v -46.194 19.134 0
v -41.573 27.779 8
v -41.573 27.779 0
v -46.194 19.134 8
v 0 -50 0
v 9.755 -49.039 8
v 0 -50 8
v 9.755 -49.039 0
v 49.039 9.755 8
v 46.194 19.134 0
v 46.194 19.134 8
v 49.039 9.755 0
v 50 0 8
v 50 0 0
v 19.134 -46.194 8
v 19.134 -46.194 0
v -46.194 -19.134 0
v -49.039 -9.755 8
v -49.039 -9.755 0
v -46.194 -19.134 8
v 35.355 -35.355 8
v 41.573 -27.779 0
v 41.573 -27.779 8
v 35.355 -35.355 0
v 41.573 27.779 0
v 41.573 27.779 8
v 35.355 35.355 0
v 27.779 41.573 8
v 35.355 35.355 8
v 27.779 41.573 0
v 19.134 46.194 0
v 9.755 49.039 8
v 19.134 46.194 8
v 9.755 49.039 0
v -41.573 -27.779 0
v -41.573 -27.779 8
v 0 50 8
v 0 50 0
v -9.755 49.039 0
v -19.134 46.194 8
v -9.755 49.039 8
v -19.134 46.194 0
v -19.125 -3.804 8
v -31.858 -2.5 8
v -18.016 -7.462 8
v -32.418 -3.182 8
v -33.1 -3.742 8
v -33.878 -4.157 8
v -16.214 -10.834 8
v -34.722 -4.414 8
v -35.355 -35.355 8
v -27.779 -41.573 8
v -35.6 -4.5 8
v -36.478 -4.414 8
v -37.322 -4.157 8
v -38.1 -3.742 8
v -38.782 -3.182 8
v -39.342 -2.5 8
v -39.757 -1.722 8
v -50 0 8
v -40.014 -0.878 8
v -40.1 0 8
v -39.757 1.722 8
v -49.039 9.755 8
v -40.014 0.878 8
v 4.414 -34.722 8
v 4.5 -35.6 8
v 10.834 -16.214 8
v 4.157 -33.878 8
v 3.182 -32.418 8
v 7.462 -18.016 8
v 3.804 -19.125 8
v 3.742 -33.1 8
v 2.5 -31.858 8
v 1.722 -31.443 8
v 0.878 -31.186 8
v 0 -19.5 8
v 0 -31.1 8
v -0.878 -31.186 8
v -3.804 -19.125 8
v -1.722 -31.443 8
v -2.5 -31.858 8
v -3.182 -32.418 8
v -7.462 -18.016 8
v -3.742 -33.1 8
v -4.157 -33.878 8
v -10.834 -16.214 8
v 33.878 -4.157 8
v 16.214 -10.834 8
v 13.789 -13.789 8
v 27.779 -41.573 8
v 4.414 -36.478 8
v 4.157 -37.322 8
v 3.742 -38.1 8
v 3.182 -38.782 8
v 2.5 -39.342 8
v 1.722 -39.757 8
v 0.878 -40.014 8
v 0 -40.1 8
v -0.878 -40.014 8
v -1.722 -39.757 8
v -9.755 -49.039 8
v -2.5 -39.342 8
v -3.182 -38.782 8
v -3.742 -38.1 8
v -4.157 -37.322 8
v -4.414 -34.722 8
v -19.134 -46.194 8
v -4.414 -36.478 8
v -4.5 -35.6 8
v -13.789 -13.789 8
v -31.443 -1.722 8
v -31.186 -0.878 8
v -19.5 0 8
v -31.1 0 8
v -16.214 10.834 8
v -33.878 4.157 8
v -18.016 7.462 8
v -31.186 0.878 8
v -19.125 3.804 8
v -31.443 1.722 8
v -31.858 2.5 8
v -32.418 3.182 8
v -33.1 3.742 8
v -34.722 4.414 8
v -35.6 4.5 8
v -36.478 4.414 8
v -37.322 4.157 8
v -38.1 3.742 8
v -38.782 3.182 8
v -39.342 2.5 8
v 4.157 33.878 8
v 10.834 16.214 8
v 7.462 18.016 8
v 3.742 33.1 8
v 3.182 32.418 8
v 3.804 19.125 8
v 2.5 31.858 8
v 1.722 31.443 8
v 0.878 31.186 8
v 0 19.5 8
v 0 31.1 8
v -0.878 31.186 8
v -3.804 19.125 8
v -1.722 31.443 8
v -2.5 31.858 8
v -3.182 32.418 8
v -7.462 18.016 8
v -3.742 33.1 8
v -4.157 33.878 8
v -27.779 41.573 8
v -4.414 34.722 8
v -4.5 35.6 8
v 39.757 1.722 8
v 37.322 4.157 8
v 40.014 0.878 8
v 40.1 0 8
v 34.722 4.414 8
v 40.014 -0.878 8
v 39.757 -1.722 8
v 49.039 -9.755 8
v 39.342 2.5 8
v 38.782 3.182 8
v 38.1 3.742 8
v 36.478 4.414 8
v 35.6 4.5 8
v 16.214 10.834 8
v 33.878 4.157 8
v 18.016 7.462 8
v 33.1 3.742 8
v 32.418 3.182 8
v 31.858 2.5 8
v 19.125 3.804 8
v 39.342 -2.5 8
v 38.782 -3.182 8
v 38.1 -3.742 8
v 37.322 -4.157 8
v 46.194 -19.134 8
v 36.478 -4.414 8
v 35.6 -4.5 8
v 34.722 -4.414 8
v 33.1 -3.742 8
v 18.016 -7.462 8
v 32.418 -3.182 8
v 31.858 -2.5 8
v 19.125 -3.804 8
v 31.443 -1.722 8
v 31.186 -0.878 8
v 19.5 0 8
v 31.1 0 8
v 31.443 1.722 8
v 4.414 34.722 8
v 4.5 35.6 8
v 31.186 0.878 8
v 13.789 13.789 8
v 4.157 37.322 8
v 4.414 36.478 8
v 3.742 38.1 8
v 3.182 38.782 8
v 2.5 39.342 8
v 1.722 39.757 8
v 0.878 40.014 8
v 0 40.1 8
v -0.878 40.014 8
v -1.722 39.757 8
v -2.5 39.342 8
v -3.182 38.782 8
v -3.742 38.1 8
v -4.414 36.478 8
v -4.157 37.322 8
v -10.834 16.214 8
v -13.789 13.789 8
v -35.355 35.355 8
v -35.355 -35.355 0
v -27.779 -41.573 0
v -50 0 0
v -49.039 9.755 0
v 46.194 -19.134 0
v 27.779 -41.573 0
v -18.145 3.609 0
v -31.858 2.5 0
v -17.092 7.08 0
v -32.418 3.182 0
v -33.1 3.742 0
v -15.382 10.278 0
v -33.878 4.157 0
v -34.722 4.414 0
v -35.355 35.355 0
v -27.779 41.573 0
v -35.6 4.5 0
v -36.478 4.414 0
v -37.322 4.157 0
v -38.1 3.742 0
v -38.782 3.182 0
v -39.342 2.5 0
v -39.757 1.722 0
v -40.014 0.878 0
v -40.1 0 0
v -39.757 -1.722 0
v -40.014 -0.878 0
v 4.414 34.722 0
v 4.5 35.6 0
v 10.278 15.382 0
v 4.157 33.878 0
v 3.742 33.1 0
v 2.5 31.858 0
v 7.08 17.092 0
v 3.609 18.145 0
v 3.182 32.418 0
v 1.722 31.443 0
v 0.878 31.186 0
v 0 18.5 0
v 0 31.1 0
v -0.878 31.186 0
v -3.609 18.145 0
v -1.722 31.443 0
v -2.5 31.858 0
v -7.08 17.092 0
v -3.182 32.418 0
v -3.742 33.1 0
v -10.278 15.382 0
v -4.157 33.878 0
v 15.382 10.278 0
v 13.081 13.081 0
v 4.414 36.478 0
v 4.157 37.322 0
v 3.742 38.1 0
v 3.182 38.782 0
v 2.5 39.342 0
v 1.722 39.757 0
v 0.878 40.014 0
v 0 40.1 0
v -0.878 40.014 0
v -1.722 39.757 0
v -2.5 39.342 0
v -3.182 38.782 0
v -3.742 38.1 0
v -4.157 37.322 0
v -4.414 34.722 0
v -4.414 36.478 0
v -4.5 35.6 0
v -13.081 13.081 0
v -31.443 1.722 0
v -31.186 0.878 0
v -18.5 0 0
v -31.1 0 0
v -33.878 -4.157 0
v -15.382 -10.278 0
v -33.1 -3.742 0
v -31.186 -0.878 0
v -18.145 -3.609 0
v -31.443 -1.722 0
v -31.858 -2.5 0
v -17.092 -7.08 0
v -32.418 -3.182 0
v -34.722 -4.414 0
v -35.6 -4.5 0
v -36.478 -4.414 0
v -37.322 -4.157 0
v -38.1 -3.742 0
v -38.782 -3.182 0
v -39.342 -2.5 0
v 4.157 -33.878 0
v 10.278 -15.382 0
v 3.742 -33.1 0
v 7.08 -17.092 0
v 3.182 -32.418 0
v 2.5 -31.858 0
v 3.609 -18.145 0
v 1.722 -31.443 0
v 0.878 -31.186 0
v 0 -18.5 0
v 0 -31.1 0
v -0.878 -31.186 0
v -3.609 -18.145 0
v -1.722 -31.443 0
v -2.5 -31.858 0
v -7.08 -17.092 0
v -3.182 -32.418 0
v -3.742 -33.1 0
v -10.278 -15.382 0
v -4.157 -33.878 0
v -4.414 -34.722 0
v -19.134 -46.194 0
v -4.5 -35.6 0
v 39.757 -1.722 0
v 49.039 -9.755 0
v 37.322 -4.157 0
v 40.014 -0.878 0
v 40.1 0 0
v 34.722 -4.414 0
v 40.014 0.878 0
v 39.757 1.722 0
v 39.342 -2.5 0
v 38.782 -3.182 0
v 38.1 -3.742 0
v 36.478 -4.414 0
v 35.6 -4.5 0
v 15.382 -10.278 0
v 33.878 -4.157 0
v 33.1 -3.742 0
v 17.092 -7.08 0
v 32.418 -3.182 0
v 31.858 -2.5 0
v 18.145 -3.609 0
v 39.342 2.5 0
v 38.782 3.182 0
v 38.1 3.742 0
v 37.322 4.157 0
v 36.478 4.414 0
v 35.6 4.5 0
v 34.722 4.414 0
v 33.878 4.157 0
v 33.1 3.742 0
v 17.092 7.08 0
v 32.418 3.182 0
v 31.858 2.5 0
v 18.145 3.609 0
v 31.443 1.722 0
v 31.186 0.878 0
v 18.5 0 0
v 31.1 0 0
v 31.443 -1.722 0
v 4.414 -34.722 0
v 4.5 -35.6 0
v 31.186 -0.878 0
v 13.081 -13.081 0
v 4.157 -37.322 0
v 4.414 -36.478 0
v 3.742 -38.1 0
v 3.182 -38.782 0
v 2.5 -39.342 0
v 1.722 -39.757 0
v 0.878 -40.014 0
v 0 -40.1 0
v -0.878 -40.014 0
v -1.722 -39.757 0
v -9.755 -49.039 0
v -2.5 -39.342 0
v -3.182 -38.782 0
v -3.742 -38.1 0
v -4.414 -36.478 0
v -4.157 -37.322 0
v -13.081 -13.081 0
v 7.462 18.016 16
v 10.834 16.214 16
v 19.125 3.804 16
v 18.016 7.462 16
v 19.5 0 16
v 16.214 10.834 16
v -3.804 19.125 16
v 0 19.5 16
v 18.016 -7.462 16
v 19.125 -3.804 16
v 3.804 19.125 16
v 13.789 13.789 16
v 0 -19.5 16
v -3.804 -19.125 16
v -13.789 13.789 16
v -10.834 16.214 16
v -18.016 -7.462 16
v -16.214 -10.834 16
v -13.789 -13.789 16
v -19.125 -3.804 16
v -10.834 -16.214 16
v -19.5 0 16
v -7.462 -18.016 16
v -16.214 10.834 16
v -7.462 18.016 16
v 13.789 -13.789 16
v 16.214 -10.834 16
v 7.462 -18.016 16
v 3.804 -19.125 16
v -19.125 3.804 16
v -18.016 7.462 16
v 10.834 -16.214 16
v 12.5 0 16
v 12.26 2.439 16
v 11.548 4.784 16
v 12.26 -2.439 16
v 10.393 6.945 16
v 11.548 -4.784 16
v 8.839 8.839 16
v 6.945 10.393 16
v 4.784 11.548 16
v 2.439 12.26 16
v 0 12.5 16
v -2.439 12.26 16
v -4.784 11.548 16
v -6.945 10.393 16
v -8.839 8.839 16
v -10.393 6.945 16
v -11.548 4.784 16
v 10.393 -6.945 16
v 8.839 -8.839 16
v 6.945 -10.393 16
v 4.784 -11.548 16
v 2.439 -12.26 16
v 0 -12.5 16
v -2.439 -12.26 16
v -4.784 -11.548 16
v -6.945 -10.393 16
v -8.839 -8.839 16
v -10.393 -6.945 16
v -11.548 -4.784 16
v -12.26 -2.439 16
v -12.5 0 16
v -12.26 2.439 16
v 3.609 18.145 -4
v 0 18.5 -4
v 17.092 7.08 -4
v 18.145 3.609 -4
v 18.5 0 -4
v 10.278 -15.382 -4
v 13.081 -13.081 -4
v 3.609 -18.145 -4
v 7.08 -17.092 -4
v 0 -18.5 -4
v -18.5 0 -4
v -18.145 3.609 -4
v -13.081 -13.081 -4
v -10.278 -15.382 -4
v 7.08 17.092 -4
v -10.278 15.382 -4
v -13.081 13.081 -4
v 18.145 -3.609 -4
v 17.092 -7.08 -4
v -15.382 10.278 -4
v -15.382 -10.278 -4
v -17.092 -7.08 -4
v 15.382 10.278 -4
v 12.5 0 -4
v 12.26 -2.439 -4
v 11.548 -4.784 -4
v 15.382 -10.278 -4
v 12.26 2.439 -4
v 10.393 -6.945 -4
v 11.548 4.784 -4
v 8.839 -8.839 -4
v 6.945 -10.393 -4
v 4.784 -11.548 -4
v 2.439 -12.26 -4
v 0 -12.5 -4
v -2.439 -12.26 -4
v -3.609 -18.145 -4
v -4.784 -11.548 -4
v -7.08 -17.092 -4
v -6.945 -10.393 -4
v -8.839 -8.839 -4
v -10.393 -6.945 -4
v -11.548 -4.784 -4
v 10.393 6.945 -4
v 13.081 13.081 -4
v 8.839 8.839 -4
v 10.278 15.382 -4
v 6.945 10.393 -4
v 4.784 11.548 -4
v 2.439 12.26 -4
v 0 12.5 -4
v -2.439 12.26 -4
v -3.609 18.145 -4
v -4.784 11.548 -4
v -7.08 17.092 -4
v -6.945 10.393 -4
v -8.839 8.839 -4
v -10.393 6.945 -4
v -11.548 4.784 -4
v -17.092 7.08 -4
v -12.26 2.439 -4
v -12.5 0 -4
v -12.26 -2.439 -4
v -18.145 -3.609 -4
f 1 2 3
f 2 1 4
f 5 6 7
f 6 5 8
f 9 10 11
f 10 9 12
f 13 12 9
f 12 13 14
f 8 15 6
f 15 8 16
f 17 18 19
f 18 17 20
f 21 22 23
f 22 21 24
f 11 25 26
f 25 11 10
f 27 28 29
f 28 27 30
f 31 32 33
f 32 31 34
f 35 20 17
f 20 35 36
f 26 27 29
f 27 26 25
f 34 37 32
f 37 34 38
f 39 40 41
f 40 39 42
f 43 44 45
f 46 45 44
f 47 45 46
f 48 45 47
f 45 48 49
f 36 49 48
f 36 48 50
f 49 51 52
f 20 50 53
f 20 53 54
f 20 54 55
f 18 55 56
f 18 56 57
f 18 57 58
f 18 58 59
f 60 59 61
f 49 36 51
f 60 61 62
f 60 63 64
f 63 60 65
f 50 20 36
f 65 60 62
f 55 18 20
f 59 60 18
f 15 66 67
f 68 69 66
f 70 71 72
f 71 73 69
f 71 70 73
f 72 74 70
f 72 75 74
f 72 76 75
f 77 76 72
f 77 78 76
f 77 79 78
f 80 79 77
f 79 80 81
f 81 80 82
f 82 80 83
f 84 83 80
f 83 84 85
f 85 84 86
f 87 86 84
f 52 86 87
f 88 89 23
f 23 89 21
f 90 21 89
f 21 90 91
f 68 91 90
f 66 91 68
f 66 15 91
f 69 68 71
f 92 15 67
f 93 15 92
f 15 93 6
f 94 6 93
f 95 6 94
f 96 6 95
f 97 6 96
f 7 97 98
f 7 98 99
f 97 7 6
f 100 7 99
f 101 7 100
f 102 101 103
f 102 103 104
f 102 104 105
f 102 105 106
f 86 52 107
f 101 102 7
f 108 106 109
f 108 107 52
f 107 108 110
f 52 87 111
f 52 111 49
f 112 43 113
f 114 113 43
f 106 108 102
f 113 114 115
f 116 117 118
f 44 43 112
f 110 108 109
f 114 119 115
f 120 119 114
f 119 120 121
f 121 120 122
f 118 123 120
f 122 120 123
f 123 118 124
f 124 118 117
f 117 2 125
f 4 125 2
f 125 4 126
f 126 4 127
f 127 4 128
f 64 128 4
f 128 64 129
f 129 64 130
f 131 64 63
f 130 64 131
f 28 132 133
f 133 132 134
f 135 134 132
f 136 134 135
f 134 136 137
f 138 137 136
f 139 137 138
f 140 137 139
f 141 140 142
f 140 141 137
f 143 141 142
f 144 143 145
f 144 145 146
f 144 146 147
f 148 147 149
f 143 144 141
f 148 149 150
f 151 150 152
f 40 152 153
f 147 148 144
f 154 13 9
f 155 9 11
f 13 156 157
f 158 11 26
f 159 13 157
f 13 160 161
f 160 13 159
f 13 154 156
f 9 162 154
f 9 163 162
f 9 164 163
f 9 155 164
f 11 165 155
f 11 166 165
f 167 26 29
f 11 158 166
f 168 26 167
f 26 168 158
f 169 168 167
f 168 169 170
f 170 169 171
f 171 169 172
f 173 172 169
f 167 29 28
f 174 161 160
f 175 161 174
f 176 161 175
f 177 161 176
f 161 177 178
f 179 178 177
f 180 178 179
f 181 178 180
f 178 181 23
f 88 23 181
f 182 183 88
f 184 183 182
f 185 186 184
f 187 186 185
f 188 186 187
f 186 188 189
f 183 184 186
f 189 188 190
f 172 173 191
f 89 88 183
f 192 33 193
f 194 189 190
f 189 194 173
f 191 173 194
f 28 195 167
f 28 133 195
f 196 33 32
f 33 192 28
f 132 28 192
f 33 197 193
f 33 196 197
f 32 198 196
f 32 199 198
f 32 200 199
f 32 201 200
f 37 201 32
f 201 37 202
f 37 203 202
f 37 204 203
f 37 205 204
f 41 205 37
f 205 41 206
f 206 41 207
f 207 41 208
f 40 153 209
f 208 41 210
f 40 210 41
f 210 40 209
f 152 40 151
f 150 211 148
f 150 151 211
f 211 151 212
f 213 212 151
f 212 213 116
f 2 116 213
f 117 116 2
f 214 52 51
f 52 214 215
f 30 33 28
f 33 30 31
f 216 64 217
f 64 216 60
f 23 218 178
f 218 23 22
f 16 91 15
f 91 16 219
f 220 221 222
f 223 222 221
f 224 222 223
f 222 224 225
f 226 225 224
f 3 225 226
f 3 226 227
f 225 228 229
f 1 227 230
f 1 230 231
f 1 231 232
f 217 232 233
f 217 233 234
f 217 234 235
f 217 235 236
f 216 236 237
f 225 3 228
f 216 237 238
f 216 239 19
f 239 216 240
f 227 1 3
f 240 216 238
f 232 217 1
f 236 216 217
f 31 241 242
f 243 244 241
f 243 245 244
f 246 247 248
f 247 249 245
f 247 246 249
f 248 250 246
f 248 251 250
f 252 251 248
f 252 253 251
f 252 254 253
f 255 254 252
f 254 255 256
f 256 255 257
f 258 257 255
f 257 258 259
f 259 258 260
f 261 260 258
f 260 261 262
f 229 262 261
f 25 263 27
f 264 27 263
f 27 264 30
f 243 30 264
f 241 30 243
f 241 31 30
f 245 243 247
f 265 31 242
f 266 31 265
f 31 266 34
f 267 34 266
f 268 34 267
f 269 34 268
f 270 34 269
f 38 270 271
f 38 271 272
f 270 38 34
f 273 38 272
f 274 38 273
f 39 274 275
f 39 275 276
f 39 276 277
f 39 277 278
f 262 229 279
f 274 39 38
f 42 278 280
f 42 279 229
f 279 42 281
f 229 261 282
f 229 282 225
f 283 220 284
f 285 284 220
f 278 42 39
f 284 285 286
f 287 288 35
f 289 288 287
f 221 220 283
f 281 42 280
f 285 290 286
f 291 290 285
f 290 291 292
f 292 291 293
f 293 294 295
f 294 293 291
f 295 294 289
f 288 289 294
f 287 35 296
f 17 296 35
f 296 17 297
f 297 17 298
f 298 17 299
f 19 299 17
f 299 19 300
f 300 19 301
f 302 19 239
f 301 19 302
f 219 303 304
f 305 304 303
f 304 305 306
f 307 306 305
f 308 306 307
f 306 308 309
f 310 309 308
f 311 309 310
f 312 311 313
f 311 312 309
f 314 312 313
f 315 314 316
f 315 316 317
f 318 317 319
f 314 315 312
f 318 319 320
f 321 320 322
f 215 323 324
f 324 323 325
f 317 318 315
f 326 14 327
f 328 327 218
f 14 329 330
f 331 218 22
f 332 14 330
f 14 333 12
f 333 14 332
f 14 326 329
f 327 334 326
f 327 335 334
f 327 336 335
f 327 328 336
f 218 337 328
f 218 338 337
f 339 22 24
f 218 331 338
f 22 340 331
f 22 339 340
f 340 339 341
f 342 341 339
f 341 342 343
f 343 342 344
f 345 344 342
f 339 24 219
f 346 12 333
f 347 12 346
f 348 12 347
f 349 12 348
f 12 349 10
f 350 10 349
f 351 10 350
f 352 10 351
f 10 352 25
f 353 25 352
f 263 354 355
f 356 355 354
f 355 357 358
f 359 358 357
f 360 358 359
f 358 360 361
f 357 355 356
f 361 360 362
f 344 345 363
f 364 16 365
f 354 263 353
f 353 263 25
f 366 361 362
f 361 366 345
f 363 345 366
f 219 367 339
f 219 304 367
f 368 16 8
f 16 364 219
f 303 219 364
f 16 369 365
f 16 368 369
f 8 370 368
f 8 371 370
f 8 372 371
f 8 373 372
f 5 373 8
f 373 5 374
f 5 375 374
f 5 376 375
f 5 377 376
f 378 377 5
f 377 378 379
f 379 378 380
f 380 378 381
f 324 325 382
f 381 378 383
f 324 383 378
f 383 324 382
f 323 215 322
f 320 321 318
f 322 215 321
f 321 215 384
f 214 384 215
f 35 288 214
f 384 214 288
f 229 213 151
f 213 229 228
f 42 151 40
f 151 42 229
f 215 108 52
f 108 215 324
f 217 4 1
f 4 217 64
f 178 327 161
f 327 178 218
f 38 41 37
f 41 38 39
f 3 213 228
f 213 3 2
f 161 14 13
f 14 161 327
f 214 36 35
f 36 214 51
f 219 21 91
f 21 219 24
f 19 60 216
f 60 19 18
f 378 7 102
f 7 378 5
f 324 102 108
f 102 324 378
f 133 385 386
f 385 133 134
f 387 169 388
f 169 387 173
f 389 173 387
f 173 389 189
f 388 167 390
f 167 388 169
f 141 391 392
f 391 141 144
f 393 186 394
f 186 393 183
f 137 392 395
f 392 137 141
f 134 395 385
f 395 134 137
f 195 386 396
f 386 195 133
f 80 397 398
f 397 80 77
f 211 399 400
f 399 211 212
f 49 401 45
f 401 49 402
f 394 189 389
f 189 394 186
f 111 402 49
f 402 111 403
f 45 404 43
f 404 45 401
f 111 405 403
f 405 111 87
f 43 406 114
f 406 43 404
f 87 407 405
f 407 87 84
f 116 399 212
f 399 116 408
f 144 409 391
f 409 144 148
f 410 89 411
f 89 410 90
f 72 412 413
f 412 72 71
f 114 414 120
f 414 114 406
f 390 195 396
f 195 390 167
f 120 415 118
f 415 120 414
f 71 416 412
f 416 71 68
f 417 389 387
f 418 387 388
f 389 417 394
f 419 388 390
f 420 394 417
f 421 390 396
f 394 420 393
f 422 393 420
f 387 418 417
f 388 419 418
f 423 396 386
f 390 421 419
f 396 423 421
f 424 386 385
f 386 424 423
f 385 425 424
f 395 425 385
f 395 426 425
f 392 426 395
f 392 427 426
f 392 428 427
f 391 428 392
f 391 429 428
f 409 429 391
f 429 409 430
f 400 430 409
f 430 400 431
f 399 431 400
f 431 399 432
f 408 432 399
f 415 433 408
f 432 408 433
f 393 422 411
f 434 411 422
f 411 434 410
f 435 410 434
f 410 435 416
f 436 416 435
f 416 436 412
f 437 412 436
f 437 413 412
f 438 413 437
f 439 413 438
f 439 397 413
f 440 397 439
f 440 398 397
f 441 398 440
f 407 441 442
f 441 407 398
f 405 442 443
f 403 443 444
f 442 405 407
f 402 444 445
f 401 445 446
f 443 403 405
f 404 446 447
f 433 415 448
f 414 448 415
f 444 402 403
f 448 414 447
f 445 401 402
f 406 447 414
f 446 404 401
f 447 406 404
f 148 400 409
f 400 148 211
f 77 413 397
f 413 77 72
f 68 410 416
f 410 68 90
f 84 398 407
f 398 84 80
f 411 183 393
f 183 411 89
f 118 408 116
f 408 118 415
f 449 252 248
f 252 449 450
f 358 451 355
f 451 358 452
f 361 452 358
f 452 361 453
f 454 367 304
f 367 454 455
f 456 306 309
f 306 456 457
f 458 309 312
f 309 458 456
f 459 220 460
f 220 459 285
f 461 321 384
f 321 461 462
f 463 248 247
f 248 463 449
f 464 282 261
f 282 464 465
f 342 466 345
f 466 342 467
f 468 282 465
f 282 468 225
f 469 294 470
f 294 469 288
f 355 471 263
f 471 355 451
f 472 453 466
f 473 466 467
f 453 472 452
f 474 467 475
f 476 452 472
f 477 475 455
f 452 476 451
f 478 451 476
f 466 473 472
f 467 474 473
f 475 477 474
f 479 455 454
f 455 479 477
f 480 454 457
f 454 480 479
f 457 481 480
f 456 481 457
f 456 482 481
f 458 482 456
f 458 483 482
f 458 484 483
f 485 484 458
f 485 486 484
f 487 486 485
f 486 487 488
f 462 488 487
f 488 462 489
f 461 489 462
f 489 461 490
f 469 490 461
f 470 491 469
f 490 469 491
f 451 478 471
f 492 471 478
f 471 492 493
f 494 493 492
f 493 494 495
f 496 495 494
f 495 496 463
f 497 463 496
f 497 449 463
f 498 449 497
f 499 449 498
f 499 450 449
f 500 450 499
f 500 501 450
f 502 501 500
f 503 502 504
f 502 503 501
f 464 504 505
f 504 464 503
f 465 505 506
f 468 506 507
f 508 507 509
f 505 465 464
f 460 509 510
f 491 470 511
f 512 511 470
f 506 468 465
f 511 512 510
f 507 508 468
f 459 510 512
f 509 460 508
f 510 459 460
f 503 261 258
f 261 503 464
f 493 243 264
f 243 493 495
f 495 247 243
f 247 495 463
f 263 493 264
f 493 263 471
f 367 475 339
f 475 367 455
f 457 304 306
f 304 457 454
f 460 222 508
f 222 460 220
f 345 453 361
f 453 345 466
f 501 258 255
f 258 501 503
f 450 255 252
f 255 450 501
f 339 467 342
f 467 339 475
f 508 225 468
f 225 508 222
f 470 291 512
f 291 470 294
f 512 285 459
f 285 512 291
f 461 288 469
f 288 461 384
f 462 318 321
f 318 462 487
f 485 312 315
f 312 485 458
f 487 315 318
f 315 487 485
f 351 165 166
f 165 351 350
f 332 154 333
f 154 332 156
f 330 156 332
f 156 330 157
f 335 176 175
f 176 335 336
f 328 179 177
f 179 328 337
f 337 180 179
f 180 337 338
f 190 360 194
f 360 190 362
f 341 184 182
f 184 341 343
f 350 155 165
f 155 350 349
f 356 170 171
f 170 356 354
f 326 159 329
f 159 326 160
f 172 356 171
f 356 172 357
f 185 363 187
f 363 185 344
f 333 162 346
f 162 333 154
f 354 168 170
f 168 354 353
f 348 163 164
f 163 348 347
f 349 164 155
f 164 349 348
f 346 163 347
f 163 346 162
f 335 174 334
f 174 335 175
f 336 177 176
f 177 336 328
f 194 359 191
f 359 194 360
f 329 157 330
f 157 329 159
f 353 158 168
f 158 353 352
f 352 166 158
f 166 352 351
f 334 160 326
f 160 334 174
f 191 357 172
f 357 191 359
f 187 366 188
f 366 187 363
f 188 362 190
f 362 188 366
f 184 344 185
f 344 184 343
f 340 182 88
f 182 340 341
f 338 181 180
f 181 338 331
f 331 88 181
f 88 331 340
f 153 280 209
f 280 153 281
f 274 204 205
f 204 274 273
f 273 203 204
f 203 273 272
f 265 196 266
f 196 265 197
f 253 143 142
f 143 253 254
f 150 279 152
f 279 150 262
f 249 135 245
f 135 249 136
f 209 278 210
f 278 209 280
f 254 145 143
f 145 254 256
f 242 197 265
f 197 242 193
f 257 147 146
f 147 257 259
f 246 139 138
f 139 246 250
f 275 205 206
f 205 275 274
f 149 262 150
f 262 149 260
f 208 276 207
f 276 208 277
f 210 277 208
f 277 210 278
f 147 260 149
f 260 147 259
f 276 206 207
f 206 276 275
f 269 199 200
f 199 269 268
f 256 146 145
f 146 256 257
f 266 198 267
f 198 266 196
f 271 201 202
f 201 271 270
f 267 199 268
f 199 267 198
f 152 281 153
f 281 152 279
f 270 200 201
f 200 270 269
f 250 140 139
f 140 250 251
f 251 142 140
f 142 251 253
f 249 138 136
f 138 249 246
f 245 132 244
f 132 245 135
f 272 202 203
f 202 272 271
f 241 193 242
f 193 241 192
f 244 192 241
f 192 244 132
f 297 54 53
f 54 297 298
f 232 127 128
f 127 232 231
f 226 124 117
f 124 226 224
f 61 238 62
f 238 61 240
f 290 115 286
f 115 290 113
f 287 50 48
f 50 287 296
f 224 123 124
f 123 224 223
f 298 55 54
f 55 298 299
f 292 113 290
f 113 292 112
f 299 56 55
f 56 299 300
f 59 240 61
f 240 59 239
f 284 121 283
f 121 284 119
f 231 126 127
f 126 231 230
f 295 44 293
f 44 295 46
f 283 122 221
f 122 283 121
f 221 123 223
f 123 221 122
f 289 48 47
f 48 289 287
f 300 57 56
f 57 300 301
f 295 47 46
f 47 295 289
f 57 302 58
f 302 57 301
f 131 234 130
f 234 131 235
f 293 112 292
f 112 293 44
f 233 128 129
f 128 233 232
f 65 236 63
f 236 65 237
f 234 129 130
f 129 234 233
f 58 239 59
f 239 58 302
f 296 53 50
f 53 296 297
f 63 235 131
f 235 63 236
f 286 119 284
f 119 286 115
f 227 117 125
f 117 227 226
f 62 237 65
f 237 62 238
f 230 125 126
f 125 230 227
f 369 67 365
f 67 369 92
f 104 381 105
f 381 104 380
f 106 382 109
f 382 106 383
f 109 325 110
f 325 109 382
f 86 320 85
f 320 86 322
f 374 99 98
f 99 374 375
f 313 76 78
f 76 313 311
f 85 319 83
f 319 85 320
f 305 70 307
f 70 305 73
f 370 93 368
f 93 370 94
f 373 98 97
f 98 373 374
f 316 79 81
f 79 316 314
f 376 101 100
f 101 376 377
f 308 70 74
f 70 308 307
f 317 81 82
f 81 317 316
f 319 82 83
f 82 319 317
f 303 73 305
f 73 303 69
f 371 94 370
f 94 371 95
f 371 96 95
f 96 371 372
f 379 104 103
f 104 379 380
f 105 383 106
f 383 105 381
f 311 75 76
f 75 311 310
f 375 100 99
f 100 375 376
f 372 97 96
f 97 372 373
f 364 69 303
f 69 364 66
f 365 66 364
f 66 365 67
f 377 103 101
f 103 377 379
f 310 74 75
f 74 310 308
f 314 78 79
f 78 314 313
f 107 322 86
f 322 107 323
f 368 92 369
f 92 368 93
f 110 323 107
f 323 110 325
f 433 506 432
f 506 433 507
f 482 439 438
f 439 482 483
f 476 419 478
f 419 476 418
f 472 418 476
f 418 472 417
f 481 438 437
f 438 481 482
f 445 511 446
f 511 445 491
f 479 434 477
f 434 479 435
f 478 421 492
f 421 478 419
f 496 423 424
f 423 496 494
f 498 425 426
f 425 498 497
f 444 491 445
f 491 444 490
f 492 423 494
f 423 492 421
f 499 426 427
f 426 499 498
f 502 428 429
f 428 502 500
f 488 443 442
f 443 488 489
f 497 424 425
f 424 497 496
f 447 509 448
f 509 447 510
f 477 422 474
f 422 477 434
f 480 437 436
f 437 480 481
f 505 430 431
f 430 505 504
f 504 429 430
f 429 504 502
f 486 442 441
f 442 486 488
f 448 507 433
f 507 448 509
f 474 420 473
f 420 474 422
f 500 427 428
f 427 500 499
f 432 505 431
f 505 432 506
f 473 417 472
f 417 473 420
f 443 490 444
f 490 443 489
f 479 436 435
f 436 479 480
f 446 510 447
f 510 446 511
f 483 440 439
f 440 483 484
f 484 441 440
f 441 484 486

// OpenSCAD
$fn = 32;

// ----------------------------------------------------------------------
// Bolt-circle flange: 100 mm outside, 4 bolt holes, bore 25 mm
// ----------------------------------------------------------------------

// --- parameters (mm) ---
flange_d = 100;           // flange outside diameter
flange_t = 8;             // flange thickness
bolts = 4;                // number of bolt holes
bolt_d = 9;               // bolt clearance
bolt_r = 35.6;            // bolt circle radius
bore_d = 25;              // centre bore
hub_d = 39;               // raised hub diameter
hub_h = 8;                // raised hub height
spigot_d = 37;            // spigot diameter
spigot_h = 5;             // spigot height below the flange
sink = 1;                 // overlap into the flange

module body() {
  cylinder(h = flange_t, d = flange_d);
  /* raised hub, sunk 1 mm into the flange */
  translate([0, 0, flange_t - 1]) cylinder(h = hub_h + 1, d = hub_d);
  /* spigot on the back face, sunk into the flange */
  translate([0, 0, -spigot_h + sink]) cylinder(h = spigot_h, d = spigot_d);
}

difference() {
  body();
  /* bolt circle */
  for (i = [0 : bolts - 1]) rotate([0, 0, i * 360 / bolts]) translate([bolt_r, 0, -spigot_h - 1]) cylinder(h = flange_t + hub_h + spigot_h + 3, d = bolt_d);
  translate([0, 0, -spigot_h - 1]) cylinder(h = flange_t + hub_h + spigot_h + 3, d = bore_d);
}
